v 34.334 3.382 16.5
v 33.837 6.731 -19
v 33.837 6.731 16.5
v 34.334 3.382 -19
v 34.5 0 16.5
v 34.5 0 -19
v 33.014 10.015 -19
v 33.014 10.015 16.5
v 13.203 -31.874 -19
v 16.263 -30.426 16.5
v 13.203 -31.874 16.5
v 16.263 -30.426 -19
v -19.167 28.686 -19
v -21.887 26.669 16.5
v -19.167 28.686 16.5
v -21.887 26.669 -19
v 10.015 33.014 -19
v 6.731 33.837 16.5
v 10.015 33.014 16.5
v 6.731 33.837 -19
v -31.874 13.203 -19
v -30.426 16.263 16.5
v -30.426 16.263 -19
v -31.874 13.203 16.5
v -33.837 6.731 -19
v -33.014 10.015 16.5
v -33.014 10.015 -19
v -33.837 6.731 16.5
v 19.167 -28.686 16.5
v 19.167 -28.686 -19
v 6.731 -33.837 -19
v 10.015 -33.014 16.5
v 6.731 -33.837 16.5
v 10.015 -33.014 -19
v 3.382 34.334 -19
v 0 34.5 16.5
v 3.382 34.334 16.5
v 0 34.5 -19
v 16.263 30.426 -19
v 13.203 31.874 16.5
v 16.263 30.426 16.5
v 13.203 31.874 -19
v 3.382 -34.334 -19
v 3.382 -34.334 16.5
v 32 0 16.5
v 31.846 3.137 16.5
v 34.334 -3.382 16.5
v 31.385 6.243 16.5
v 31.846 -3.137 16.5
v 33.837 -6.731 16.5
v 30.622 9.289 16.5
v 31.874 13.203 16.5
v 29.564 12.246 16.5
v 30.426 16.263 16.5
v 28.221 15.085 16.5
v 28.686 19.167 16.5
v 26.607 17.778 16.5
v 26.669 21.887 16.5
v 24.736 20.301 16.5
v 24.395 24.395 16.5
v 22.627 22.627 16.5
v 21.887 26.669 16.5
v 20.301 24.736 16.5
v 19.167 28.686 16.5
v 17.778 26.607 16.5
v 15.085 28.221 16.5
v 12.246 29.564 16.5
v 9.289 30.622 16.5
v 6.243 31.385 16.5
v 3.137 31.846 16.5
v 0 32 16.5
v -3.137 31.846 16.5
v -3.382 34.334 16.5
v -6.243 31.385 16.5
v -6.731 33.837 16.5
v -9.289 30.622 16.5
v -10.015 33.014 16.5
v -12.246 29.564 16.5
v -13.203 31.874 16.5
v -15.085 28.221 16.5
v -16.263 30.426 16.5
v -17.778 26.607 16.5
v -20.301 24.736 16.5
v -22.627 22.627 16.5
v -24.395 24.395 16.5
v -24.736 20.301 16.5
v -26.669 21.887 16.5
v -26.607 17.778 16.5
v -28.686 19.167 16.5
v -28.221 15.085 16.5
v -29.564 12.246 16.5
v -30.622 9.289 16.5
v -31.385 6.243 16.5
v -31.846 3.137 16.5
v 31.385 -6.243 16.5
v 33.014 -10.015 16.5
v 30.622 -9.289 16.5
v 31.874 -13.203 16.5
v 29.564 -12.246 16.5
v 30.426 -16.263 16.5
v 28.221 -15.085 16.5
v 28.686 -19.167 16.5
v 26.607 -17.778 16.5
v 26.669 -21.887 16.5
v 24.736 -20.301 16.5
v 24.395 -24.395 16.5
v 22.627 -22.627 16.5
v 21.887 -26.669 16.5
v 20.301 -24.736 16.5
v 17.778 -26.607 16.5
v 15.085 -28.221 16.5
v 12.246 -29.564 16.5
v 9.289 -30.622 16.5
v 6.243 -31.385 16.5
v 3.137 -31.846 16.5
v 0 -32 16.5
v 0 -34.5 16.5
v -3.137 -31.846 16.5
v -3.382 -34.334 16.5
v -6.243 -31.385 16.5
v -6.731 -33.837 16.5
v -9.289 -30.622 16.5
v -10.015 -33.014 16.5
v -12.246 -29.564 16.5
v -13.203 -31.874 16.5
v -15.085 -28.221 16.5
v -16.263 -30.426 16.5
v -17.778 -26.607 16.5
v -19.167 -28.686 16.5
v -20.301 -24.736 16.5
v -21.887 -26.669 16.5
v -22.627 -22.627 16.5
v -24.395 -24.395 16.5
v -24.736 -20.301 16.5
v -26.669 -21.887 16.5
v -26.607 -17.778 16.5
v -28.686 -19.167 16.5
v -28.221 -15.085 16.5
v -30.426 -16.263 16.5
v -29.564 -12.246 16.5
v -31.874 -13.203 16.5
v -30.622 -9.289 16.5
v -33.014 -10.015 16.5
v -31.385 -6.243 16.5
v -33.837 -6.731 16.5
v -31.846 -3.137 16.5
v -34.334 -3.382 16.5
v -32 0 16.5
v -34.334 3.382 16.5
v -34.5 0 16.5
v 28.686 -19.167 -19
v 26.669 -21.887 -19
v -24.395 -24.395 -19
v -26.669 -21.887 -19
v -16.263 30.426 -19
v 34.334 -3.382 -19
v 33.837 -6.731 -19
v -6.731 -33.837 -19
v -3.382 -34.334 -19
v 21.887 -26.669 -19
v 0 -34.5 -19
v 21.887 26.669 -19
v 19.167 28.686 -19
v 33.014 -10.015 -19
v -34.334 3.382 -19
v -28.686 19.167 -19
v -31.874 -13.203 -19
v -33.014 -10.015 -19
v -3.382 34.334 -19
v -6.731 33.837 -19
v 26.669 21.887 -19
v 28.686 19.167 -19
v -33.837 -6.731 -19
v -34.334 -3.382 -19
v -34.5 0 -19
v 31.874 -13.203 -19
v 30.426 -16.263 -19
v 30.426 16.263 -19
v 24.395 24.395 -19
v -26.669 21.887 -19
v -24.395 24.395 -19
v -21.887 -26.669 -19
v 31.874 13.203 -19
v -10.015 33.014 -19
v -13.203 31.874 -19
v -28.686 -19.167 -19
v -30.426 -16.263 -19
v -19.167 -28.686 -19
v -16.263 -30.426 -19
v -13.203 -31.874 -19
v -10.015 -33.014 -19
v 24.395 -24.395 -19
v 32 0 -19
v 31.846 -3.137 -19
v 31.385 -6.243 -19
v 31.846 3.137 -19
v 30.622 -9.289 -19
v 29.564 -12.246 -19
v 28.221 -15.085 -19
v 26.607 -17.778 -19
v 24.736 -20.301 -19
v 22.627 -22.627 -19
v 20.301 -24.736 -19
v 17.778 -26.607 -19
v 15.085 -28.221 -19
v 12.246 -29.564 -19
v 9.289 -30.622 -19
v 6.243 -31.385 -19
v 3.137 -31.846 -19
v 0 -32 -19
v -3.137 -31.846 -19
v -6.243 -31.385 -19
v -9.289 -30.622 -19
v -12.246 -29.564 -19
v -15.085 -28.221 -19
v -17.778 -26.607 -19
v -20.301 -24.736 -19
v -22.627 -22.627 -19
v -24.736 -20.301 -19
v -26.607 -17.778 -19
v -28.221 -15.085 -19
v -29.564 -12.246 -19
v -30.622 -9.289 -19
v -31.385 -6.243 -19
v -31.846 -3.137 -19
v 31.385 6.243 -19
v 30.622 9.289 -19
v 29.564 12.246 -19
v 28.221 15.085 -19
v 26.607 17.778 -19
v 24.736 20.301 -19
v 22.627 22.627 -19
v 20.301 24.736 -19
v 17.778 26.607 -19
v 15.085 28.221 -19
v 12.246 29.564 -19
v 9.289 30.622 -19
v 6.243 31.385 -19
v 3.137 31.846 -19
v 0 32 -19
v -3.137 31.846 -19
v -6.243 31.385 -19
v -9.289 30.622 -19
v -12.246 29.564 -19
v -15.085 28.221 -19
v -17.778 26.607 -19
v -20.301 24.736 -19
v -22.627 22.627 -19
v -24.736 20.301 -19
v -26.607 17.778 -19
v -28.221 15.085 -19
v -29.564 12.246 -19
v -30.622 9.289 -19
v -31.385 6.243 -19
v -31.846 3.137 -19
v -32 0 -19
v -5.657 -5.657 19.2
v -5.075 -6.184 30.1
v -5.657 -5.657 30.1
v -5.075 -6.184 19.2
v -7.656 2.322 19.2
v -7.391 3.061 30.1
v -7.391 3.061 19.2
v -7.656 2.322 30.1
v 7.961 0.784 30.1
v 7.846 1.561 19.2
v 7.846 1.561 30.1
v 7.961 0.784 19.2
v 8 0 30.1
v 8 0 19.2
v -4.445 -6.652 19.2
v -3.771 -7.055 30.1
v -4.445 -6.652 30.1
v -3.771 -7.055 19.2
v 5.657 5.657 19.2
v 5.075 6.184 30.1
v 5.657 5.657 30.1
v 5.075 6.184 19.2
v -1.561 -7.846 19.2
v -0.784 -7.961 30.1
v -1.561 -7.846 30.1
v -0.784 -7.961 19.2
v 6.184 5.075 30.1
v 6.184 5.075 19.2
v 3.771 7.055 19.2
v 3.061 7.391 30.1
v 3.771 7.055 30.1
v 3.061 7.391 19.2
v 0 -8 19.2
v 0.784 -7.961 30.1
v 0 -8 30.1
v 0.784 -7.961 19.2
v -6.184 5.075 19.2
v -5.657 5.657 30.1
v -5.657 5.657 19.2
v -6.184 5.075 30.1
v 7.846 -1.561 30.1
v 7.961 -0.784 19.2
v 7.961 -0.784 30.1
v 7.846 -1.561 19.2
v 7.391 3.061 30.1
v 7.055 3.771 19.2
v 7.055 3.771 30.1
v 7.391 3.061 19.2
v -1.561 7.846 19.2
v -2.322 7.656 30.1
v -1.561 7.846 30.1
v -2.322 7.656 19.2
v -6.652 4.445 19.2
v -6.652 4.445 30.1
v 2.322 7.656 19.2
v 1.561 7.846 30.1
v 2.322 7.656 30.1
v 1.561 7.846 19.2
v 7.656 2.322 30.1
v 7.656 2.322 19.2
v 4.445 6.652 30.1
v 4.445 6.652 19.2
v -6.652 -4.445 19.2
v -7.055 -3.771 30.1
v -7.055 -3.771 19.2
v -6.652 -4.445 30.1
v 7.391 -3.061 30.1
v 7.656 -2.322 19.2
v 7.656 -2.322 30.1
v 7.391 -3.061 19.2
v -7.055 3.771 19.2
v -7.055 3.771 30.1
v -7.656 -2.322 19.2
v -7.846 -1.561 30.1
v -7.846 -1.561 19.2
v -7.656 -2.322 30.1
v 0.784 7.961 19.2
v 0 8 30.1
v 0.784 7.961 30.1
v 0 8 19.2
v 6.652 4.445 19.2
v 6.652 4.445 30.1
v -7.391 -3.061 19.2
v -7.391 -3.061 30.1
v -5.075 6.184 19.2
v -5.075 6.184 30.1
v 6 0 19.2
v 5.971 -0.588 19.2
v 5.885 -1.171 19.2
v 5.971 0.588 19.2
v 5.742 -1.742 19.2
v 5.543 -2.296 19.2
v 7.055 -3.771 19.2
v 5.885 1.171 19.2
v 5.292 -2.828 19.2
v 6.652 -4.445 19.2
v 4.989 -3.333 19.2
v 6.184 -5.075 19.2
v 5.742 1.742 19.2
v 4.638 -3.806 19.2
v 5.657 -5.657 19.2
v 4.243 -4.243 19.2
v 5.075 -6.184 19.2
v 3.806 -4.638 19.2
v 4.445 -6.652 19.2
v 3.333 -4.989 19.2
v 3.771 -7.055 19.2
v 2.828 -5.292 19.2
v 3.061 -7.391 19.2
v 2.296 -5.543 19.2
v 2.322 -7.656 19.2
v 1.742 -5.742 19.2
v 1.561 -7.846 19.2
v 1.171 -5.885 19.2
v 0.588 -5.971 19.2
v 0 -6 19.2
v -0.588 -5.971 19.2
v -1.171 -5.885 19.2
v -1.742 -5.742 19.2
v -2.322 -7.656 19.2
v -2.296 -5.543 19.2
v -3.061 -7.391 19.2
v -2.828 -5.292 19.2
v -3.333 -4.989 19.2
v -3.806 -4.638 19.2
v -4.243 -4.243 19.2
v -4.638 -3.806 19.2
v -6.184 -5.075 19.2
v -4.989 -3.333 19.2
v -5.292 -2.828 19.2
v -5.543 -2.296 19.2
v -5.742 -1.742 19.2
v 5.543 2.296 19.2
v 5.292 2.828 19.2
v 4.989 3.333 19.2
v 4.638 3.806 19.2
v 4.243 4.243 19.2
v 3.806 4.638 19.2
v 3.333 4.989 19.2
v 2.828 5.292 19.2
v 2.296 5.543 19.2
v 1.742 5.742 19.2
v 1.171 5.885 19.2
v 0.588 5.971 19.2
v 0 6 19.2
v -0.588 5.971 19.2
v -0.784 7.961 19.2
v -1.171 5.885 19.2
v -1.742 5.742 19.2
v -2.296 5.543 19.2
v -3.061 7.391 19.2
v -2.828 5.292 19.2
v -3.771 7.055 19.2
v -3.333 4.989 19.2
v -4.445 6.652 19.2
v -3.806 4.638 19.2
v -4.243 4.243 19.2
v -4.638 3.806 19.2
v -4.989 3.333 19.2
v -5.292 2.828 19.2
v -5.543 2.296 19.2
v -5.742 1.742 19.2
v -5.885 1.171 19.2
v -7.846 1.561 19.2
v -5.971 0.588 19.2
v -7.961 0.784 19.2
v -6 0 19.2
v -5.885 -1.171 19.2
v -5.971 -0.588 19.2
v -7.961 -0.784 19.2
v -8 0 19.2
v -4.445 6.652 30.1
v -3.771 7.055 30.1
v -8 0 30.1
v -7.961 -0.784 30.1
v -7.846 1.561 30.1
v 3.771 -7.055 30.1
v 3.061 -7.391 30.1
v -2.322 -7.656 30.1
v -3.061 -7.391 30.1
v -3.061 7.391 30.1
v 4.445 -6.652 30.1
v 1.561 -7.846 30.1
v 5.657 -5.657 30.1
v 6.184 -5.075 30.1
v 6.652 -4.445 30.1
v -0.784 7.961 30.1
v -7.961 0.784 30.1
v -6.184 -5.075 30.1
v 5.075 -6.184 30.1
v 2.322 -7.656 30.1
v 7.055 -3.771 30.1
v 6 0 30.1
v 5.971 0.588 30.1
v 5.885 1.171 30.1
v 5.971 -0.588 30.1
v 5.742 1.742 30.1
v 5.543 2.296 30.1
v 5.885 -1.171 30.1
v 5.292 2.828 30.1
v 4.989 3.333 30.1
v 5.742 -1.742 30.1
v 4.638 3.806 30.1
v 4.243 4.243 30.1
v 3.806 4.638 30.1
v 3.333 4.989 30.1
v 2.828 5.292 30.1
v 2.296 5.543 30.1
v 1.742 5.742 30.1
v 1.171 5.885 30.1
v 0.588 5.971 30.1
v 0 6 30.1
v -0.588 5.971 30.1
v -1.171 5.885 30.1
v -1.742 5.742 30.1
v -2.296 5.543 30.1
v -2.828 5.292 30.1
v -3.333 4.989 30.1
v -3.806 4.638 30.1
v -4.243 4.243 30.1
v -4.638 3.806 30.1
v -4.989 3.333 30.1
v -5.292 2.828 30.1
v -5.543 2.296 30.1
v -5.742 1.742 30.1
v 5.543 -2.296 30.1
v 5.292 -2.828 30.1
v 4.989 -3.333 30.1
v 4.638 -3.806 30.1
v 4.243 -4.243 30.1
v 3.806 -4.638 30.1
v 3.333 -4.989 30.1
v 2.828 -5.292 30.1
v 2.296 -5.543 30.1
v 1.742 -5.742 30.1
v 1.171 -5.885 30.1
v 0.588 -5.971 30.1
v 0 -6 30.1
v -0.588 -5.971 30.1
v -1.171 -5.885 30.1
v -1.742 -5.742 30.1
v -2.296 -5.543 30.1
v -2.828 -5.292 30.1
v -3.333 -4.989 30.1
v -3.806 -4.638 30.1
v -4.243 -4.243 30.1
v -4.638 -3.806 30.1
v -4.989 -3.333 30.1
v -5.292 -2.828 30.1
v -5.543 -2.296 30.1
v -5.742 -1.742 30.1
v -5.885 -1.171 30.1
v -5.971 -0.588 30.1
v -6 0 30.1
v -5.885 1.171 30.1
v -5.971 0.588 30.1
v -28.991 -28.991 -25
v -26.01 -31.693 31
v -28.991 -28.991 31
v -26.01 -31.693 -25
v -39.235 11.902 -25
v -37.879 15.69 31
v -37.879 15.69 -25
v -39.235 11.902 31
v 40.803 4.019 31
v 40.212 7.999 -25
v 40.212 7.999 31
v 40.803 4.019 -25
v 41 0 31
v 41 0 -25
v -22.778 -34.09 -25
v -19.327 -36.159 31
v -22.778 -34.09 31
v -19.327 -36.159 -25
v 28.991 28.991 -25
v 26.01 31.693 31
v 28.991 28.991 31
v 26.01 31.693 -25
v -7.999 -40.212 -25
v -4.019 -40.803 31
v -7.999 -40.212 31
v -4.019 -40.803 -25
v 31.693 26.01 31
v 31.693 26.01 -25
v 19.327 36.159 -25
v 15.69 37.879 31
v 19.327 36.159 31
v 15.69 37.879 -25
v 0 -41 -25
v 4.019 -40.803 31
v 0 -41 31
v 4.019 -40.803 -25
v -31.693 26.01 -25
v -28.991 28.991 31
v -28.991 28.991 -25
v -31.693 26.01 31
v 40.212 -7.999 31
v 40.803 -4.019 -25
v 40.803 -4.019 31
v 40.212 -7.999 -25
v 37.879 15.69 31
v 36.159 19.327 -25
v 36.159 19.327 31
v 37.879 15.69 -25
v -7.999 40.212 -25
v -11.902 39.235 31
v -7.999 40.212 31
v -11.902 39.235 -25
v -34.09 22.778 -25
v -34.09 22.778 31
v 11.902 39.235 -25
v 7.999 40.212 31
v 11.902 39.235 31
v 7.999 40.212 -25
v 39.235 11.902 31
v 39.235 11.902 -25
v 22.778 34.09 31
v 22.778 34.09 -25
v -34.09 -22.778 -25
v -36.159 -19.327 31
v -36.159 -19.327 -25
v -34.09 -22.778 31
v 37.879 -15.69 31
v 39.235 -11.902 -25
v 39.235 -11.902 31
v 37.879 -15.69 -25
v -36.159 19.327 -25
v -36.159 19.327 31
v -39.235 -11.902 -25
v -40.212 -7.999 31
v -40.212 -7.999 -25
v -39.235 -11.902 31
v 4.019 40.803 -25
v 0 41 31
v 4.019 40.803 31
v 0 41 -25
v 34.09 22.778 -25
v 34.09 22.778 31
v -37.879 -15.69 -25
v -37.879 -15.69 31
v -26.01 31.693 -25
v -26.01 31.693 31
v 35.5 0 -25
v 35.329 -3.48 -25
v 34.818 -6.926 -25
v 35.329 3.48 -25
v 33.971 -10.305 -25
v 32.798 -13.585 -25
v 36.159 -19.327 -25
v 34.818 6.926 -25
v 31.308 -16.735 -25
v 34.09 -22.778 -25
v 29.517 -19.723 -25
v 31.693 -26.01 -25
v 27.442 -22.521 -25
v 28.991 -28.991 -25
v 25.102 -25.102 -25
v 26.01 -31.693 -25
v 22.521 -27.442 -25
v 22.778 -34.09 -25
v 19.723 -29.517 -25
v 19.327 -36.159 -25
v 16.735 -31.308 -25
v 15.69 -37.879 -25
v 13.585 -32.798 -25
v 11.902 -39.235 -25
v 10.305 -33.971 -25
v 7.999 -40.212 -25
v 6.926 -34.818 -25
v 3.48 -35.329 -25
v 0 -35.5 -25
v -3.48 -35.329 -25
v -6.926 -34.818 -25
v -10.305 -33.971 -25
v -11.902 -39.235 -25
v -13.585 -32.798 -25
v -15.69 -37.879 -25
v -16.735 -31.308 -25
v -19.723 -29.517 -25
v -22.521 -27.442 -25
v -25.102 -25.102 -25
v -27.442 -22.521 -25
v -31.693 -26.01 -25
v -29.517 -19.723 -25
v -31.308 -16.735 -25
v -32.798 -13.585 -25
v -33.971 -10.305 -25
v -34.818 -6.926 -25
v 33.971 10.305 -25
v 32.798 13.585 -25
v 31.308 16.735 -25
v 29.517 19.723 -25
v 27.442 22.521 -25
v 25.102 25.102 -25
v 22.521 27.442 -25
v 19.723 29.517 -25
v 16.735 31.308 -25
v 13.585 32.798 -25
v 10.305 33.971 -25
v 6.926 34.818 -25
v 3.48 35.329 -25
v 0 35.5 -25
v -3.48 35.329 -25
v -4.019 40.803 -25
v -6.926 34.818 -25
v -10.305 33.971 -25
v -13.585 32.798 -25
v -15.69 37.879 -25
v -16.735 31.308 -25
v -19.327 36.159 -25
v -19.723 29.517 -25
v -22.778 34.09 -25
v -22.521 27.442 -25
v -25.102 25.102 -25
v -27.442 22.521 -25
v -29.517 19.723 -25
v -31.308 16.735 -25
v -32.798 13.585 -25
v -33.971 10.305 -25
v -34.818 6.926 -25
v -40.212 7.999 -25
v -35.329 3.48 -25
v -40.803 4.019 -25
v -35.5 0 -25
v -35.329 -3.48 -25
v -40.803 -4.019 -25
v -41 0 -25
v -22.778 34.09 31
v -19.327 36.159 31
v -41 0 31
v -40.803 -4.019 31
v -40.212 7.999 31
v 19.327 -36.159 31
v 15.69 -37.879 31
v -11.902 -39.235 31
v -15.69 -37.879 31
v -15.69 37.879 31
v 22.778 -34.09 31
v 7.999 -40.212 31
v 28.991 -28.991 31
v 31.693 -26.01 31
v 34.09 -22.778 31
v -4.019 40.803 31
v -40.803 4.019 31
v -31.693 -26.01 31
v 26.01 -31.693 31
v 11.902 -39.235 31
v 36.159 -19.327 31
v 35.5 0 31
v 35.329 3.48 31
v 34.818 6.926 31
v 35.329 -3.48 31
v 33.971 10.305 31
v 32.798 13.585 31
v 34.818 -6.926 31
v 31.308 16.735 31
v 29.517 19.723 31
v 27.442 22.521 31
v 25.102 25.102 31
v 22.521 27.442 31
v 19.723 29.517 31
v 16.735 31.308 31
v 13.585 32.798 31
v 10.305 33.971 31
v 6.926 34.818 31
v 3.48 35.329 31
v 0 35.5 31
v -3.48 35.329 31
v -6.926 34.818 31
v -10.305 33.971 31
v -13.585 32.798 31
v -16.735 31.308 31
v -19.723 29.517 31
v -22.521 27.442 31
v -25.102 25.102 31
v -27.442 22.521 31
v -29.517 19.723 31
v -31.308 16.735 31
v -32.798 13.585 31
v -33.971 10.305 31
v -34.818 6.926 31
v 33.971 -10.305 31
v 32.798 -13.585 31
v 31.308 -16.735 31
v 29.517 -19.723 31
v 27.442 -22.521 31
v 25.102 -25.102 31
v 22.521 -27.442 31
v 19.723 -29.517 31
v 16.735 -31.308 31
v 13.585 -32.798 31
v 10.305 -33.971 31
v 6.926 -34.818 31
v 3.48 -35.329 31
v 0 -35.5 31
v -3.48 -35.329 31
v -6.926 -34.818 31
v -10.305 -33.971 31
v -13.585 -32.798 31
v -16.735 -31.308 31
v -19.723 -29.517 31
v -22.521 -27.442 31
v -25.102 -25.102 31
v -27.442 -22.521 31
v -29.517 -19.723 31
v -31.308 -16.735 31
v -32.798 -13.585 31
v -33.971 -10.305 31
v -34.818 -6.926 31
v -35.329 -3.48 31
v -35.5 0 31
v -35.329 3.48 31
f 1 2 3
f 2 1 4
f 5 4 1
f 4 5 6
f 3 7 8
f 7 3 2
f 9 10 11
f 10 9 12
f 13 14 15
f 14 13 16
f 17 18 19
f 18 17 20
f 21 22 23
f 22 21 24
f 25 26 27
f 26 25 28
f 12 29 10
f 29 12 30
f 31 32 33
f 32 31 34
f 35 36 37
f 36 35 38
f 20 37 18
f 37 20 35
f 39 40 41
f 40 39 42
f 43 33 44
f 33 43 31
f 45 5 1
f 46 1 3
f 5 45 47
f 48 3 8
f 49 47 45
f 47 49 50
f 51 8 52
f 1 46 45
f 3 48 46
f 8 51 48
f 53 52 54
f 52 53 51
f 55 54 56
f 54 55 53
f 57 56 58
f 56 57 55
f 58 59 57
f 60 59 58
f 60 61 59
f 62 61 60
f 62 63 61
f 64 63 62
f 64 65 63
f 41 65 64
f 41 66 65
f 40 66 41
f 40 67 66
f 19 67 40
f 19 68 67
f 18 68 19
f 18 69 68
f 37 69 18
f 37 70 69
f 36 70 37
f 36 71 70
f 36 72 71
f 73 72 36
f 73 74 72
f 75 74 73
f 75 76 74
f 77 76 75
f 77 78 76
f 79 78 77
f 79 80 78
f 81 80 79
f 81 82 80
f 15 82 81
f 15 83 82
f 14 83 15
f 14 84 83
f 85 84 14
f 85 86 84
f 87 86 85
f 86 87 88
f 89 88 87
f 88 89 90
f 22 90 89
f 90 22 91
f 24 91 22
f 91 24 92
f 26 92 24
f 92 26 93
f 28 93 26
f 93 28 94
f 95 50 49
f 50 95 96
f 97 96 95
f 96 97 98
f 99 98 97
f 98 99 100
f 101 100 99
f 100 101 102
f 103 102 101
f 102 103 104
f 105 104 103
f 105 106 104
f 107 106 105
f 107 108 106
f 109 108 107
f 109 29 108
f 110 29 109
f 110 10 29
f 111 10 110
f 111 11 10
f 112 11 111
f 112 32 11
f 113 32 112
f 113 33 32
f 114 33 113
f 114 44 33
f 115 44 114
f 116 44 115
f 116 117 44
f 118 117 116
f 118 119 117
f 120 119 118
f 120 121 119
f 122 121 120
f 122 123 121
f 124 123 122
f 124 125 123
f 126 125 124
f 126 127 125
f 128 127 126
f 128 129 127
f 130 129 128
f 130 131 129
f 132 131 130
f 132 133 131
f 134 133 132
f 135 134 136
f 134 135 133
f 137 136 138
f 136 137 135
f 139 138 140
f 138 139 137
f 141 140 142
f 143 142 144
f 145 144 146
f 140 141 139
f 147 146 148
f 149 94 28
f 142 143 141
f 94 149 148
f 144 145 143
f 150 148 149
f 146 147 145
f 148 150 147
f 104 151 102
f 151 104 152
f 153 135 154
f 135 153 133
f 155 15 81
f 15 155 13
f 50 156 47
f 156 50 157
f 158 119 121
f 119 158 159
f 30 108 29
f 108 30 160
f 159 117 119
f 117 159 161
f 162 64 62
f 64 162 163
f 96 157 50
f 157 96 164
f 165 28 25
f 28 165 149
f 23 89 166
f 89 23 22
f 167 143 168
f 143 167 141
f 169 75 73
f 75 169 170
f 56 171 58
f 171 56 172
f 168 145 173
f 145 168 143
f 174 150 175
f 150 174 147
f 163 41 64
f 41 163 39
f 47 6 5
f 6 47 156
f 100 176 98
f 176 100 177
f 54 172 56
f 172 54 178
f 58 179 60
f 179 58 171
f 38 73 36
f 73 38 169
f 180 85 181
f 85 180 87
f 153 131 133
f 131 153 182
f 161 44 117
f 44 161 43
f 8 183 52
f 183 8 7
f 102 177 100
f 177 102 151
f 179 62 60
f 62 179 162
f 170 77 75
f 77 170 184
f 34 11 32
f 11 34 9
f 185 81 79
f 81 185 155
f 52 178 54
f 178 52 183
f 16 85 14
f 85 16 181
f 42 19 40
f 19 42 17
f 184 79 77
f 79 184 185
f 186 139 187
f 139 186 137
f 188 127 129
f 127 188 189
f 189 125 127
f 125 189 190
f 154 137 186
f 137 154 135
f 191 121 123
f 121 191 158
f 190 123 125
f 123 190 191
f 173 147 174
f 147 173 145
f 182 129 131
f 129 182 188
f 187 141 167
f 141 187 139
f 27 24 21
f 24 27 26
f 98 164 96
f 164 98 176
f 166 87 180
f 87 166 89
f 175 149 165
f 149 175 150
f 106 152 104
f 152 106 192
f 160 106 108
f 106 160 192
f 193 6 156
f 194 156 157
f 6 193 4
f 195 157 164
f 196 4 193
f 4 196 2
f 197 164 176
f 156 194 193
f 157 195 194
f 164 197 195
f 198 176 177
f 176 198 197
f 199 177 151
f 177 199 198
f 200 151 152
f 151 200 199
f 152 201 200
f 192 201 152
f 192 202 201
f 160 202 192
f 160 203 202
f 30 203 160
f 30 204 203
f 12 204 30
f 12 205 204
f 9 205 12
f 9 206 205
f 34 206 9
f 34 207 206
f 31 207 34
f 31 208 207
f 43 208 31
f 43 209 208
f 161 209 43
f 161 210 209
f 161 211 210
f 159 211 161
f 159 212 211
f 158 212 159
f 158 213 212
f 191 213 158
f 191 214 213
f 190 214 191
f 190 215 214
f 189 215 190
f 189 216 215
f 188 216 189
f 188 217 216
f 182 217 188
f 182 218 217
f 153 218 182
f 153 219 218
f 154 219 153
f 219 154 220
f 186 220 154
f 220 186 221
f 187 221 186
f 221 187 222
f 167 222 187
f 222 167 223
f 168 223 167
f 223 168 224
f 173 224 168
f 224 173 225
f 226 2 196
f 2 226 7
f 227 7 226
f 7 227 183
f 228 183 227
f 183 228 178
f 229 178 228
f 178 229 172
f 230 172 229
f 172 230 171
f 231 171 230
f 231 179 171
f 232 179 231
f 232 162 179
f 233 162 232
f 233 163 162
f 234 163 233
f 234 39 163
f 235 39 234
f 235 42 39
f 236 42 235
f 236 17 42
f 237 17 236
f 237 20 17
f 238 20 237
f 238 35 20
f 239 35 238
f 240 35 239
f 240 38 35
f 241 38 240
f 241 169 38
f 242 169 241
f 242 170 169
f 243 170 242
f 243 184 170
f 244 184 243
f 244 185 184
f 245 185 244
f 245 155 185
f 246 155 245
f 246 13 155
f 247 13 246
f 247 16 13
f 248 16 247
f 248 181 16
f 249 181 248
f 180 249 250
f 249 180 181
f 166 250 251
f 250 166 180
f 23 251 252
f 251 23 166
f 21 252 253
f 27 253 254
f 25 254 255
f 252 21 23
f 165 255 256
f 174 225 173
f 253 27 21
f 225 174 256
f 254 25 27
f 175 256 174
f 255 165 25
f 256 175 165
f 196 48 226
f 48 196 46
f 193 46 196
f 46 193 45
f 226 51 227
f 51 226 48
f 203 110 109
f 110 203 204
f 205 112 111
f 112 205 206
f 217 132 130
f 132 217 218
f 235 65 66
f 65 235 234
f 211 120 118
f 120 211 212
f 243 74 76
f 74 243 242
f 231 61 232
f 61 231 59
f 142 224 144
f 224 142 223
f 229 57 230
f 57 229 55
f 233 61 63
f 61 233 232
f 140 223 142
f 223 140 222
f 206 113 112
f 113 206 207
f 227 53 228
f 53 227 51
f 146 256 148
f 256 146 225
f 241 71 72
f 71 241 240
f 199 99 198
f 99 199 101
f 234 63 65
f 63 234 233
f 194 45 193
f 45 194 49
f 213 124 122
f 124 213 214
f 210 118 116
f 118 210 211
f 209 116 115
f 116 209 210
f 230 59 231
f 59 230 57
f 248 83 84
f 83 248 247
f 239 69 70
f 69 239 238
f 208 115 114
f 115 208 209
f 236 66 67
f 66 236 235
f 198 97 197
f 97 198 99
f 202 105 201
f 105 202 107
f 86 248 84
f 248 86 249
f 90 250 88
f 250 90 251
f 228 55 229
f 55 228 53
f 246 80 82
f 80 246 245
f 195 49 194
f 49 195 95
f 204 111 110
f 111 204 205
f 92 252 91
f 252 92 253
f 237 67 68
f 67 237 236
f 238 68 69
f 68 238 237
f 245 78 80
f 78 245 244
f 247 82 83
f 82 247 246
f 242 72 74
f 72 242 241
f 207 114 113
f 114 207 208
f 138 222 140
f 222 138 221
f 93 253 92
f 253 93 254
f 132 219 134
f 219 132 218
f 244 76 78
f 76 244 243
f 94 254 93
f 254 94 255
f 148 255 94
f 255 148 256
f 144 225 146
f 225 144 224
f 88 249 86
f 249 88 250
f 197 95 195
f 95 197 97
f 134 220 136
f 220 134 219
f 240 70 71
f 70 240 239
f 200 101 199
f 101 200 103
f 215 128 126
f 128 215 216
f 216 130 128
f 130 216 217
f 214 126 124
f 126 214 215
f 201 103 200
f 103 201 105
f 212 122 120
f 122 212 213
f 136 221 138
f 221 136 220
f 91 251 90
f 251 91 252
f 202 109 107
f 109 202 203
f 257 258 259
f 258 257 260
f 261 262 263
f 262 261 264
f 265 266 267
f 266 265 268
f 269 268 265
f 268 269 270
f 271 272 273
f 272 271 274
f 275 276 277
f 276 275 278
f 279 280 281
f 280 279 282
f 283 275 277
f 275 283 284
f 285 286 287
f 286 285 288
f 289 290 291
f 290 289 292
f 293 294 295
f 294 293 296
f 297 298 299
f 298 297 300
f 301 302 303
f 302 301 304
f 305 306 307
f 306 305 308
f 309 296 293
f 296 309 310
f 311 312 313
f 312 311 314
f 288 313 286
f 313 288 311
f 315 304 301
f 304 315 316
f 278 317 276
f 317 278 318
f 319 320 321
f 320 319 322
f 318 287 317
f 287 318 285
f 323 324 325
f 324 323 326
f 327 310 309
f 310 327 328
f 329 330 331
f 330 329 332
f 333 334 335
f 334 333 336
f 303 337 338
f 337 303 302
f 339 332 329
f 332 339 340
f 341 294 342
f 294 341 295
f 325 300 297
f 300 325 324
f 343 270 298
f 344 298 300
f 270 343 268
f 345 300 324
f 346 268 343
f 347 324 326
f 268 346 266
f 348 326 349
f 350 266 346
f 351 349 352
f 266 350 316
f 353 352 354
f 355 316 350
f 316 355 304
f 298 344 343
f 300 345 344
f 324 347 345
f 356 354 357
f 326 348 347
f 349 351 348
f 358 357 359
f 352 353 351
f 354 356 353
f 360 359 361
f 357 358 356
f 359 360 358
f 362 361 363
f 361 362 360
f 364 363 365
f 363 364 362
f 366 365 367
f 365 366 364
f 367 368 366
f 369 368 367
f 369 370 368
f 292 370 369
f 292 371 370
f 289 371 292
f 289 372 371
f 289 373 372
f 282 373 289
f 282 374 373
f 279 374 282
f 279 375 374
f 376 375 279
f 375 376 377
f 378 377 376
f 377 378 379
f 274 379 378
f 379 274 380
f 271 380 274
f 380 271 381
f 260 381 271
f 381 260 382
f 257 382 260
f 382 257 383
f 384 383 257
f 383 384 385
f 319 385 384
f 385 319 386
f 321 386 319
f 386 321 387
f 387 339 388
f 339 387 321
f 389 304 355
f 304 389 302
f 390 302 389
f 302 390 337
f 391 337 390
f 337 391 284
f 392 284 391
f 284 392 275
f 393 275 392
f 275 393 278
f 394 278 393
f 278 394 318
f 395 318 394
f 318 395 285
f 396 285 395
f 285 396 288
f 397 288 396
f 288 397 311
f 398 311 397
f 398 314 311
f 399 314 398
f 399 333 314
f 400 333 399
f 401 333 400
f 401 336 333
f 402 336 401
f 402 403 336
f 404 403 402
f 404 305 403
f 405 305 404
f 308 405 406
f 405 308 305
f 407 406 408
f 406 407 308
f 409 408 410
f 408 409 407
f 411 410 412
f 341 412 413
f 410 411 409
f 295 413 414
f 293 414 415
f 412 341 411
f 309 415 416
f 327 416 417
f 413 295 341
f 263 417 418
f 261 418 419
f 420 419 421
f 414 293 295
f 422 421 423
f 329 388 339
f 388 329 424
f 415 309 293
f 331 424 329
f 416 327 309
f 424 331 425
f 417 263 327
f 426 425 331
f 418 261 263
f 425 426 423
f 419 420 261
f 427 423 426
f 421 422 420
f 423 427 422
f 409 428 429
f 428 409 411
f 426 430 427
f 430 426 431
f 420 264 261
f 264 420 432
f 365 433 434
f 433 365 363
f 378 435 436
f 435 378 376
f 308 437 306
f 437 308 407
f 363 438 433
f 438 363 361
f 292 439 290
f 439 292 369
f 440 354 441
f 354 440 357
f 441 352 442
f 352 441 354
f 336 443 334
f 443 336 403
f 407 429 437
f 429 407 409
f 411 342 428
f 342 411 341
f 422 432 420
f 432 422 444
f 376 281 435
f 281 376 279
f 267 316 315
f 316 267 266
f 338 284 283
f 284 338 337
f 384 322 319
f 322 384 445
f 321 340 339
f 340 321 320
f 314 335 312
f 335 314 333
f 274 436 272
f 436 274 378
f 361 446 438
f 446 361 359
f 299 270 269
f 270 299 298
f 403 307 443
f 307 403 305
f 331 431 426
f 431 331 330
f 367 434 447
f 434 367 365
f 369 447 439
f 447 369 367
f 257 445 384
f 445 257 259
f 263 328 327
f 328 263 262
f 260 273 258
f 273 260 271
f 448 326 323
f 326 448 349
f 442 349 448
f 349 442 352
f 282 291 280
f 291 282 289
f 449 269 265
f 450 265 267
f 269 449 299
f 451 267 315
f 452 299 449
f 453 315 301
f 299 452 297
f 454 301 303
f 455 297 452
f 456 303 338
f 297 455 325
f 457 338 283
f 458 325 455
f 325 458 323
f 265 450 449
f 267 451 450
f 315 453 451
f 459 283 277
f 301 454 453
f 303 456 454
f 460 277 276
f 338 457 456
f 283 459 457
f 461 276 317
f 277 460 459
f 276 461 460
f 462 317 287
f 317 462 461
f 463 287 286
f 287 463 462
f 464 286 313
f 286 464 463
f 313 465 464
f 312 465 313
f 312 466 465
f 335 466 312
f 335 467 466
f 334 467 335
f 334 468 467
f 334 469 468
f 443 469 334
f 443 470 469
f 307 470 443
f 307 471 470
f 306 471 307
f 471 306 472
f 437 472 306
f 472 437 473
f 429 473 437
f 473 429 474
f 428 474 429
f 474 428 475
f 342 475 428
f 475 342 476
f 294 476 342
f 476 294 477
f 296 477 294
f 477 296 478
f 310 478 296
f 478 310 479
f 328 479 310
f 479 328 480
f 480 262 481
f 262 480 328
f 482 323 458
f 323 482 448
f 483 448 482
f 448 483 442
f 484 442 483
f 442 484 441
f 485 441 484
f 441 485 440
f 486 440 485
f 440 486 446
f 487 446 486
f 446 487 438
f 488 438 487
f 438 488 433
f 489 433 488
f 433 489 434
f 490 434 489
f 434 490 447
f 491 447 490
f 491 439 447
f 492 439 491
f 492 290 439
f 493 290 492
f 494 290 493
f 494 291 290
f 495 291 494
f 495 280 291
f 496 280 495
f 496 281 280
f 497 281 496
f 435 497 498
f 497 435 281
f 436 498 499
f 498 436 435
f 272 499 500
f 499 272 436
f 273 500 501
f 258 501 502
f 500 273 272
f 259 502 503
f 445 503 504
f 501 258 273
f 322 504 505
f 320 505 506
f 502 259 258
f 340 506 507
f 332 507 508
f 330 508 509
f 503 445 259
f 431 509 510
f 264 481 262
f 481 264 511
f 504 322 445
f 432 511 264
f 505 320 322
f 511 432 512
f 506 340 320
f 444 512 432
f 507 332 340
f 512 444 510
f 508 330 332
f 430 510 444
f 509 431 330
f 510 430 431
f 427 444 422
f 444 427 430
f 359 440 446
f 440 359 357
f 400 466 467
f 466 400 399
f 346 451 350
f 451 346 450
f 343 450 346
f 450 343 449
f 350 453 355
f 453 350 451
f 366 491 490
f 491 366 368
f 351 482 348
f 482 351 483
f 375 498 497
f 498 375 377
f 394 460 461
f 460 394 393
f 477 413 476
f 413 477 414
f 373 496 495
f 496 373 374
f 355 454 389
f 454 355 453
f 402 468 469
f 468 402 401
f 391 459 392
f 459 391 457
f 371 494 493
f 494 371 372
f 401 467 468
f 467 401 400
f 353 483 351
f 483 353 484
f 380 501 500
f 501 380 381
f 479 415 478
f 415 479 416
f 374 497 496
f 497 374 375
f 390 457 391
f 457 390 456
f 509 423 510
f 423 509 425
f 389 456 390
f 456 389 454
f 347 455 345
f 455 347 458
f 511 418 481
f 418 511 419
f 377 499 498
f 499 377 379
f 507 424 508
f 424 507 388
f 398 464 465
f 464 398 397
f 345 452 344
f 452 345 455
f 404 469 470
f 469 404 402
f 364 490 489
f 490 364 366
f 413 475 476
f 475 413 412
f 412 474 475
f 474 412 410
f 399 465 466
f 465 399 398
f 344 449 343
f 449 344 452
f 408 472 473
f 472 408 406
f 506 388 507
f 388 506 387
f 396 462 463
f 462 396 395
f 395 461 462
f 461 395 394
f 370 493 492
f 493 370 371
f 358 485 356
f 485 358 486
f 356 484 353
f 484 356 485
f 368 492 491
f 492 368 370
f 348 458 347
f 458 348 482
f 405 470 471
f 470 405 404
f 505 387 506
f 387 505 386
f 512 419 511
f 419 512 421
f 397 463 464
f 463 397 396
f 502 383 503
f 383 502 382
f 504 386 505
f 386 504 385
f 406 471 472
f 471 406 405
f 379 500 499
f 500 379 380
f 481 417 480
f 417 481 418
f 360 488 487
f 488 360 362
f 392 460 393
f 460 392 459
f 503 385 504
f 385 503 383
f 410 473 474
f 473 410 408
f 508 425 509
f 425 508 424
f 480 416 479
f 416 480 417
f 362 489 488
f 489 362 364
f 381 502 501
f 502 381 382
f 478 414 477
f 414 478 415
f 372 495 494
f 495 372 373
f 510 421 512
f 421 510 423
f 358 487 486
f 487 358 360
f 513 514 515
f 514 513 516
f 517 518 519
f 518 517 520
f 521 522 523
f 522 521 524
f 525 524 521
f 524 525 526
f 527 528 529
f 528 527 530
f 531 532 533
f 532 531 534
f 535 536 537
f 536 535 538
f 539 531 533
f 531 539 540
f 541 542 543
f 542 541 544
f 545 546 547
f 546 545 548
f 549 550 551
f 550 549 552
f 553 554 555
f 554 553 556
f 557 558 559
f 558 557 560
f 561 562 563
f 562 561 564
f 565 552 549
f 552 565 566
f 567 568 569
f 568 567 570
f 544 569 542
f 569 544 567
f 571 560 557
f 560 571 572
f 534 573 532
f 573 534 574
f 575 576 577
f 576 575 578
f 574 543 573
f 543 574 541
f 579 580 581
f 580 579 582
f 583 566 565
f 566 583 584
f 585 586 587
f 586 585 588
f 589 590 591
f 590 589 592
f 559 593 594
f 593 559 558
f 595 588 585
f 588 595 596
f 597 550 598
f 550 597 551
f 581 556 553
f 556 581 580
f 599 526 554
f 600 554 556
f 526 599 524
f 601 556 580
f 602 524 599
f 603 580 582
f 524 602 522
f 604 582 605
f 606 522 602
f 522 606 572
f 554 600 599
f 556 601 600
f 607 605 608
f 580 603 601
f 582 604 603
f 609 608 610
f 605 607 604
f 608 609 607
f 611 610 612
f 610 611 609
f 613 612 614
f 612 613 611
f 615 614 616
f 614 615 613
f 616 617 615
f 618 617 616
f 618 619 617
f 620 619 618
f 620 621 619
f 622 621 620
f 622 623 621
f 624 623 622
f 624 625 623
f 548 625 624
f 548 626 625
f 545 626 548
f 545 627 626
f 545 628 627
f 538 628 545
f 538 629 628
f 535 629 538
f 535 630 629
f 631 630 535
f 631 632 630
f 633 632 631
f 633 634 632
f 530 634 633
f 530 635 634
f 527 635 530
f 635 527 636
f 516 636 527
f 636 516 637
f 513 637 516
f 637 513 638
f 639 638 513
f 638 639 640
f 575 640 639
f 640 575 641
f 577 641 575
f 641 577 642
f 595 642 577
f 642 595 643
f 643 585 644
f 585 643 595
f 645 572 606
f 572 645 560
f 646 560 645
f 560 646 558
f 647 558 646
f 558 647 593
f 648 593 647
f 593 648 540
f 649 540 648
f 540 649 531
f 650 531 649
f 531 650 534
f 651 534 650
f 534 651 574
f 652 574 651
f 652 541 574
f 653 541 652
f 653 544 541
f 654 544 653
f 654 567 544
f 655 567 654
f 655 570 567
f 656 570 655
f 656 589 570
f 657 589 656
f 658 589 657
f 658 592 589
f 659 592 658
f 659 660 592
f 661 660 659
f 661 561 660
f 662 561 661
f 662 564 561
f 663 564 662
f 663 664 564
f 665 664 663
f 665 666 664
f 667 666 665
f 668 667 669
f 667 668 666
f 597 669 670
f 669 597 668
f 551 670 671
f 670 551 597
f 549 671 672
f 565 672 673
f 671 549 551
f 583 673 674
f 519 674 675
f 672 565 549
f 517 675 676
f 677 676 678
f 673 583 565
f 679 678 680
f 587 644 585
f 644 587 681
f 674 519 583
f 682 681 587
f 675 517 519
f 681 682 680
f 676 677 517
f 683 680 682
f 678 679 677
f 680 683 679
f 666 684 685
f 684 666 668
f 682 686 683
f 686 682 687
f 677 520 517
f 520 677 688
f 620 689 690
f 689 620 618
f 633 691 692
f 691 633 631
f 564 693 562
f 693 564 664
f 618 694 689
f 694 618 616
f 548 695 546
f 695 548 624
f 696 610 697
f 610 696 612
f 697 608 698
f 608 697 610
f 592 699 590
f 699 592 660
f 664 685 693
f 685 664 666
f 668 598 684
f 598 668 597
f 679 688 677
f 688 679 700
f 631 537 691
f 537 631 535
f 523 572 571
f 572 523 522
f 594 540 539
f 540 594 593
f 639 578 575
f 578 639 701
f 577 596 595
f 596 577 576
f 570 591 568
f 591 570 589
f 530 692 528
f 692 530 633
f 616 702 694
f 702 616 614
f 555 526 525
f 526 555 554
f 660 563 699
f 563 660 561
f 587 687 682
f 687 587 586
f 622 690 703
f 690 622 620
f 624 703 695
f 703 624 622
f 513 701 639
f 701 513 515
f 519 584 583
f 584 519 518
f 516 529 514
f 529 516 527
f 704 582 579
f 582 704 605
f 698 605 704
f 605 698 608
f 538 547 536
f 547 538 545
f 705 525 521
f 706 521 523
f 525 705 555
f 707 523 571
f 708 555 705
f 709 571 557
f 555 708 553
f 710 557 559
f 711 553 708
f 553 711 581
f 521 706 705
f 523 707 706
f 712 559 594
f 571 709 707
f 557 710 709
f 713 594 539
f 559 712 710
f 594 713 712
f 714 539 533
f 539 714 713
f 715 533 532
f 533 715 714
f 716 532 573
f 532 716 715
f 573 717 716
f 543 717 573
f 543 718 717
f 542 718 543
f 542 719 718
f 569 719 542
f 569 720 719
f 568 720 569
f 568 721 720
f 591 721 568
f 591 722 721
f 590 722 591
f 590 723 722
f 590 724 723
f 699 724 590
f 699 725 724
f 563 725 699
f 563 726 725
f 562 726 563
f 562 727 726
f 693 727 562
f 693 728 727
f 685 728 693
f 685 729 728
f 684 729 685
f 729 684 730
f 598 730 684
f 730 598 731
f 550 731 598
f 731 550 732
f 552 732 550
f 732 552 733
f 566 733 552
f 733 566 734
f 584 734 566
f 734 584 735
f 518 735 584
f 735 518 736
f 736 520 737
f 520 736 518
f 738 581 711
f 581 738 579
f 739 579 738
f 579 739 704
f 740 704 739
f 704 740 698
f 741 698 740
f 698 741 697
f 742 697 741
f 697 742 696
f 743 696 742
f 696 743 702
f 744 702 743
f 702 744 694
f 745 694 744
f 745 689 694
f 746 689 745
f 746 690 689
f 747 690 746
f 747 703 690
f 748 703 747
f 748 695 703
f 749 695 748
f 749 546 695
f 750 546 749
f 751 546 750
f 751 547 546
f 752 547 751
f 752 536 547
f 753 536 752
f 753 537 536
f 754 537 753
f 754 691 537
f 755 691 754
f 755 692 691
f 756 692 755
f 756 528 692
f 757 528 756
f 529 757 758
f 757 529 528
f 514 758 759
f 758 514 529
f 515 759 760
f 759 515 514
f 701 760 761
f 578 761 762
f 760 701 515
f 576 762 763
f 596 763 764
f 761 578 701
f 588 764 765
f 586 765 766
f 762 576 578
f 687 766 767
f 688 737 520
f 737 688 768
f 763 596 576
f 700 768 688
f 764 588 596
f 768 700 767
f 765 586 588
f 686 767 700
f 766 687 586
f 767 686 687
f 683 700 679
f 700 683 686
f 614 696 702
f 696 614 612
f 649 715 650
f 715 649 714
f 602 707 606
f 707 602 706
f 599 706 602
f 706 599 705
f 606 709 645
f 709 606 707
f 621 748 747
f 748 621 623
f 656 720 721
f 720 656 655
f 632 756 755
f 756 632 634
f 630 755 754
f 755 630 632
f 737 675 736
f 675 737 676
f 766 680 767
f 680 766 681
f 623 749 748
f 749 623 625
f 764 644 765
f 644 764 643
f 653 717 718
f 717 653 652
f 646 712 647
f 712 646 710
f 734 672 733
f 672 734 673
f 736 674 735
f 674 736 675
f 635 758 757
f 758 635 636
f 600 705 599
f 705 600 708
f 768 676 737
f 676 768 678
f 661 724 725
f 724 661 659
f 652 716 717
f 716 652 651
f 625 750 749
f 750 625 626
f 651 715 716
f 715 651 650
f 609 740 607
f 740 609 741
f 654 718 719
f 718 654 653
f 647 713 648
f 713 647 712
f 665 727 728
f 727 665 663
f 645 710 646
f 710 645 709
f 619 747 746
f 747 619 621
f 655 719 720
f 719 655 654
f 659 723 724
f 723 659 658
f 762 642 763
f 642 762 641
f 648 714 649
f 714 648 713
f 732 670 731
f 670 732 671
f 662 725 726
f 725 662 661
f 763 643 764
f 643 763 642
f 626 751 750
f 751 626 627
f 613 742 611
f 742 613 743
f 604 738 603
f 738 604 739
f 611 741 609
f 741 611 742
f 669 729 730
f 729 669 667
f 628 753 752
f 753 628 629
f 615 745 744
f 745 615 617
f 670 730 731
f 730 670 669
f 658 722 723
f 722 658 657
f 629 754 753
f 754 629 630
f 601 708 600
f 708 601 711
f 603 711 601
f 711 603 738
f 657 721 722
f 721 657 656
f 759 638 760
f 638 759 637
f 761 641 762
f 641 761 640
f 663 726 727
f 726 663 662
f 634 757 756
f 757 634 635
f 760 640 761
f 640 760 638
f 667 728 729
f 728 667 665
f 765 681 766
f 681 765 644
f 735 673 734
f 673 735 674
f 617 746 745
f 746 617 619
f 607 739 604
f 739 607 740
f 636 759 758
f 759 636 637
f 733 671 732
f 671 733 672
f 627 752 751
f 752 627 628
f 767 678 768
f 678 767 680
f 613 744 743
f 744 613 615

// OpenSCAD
// ============================================================================
// Atom Lithography Machine — Parametric OpenSCAD Module (S6.3-03)
// ============================================================================
// part_id           : S6.3-03
// parent_bom_id     : S6.3
// subsystem         : S6
// part_name         : Cift-katmanli Nb (RRR>300) + Cryoperm-10 Meissner kalkan kabı (Exp125 delta)
// material          : Nb
// temp_stage        : 4 K / 20 mK
// vacuum_grade      : Kriyo-vakum
// tolerance         : ±0.1 mm
// computed_mass_kg  : 1.15156
// envelope_mm       : 82.000 x 82.000 x 58.600
// design_maturity   : M0_M1_DETAILED_CAD_DESIGN_ONLY
// no_lab_measurement: true
// iec61508_certified: false
// semi_s2_certified : false
// Units: millimeters (mm)
// ============================================================================

$fn = 64;

// Nominal bounding envelope parameters (mm)
bbox_x = 82.0000;
bbox_y = 82.0000;
bbox_z = 58.6000;

// Part-specific parametric dimensions
nb_r_in = 32.0;
nb_r_out = 34.5;
cp_r_in = 35.5;
cp_r_out = 41.0;
cp_t_total = 5.0;
n_vents = 6;
rf_mode_f1_ghz = 10.5;

// Interface / port parameters (mm)
port_chimney_coax_port_od = 16.000;
port_chimney_coax_port_bore = 12.000;
port_resonator_cavity_od = 69.000;
port_resonator_cavity_bore = 64.000;
port_cryoperm_vent_base_od = 82.000;
port_cryoperm_vent_base_bore = 28.000;
port_cryoperm_vent_base_pcd = 54.000;
port_cryoperm_vent_base_bolts = 6;

module part_S6_3_03() {
  difference() {
    union() {
      // Nb RRR>300 Meissner cup w/ RF baffle
      translate([0.000, 0.000, -1.250]) {
        difference() {
          cylinder(d=69.000, h=35.500, center=true);
          cylinder(d=64.000, h=37.500, center=true);
        }
      }
      // Nb attenuating chimney
      translate([0.000, 0.000, 24.650]) {
        difference() {
          cylinder(d=16.000, h=10.900, center=true);
          cylinder(d=12.000, h=12.900, center=true);
        }
      }
      // Dual-layer 5.0 mm Cryoperm-10 outer shield
      translate([0.000, 0.000, 3.000]) {
        difference() {
          cylinder(d=82.000, h=56.000, center=true);
          cylinder(d=71.000, h=58.000, center=true);
        }
      }
    }
    // 6x M2.5 lid bolt circle
    translate([0.000, 0.000, 17.850]) {
      for (i = [0 : 6 - 1])
        rotate([0, 0, i * 360 / 6])
          translate([30.000, 0, 0])
            cylinder(d=2.700, h=4.000, center=true);
    }
    // 6x Ø3.5 mm vacuum vent holes
    translate([0.000, 0.000, -26.350]) {
      for (i = [0 : 6 - 1])
        rotate([0, 0, i * 360 / 6])
          translate([27.000, 0, 0])
            cylinder(d=3.500, h=4.000, center=true);
    }
  }
}

// World assembly mounting transform (global machine frame, mm / deg):
// translate([0.000, 0.000, 345.000]) rotate([0.000, 0.000, 0.000]) part_S6_3_03();

part_S6_3_03();
